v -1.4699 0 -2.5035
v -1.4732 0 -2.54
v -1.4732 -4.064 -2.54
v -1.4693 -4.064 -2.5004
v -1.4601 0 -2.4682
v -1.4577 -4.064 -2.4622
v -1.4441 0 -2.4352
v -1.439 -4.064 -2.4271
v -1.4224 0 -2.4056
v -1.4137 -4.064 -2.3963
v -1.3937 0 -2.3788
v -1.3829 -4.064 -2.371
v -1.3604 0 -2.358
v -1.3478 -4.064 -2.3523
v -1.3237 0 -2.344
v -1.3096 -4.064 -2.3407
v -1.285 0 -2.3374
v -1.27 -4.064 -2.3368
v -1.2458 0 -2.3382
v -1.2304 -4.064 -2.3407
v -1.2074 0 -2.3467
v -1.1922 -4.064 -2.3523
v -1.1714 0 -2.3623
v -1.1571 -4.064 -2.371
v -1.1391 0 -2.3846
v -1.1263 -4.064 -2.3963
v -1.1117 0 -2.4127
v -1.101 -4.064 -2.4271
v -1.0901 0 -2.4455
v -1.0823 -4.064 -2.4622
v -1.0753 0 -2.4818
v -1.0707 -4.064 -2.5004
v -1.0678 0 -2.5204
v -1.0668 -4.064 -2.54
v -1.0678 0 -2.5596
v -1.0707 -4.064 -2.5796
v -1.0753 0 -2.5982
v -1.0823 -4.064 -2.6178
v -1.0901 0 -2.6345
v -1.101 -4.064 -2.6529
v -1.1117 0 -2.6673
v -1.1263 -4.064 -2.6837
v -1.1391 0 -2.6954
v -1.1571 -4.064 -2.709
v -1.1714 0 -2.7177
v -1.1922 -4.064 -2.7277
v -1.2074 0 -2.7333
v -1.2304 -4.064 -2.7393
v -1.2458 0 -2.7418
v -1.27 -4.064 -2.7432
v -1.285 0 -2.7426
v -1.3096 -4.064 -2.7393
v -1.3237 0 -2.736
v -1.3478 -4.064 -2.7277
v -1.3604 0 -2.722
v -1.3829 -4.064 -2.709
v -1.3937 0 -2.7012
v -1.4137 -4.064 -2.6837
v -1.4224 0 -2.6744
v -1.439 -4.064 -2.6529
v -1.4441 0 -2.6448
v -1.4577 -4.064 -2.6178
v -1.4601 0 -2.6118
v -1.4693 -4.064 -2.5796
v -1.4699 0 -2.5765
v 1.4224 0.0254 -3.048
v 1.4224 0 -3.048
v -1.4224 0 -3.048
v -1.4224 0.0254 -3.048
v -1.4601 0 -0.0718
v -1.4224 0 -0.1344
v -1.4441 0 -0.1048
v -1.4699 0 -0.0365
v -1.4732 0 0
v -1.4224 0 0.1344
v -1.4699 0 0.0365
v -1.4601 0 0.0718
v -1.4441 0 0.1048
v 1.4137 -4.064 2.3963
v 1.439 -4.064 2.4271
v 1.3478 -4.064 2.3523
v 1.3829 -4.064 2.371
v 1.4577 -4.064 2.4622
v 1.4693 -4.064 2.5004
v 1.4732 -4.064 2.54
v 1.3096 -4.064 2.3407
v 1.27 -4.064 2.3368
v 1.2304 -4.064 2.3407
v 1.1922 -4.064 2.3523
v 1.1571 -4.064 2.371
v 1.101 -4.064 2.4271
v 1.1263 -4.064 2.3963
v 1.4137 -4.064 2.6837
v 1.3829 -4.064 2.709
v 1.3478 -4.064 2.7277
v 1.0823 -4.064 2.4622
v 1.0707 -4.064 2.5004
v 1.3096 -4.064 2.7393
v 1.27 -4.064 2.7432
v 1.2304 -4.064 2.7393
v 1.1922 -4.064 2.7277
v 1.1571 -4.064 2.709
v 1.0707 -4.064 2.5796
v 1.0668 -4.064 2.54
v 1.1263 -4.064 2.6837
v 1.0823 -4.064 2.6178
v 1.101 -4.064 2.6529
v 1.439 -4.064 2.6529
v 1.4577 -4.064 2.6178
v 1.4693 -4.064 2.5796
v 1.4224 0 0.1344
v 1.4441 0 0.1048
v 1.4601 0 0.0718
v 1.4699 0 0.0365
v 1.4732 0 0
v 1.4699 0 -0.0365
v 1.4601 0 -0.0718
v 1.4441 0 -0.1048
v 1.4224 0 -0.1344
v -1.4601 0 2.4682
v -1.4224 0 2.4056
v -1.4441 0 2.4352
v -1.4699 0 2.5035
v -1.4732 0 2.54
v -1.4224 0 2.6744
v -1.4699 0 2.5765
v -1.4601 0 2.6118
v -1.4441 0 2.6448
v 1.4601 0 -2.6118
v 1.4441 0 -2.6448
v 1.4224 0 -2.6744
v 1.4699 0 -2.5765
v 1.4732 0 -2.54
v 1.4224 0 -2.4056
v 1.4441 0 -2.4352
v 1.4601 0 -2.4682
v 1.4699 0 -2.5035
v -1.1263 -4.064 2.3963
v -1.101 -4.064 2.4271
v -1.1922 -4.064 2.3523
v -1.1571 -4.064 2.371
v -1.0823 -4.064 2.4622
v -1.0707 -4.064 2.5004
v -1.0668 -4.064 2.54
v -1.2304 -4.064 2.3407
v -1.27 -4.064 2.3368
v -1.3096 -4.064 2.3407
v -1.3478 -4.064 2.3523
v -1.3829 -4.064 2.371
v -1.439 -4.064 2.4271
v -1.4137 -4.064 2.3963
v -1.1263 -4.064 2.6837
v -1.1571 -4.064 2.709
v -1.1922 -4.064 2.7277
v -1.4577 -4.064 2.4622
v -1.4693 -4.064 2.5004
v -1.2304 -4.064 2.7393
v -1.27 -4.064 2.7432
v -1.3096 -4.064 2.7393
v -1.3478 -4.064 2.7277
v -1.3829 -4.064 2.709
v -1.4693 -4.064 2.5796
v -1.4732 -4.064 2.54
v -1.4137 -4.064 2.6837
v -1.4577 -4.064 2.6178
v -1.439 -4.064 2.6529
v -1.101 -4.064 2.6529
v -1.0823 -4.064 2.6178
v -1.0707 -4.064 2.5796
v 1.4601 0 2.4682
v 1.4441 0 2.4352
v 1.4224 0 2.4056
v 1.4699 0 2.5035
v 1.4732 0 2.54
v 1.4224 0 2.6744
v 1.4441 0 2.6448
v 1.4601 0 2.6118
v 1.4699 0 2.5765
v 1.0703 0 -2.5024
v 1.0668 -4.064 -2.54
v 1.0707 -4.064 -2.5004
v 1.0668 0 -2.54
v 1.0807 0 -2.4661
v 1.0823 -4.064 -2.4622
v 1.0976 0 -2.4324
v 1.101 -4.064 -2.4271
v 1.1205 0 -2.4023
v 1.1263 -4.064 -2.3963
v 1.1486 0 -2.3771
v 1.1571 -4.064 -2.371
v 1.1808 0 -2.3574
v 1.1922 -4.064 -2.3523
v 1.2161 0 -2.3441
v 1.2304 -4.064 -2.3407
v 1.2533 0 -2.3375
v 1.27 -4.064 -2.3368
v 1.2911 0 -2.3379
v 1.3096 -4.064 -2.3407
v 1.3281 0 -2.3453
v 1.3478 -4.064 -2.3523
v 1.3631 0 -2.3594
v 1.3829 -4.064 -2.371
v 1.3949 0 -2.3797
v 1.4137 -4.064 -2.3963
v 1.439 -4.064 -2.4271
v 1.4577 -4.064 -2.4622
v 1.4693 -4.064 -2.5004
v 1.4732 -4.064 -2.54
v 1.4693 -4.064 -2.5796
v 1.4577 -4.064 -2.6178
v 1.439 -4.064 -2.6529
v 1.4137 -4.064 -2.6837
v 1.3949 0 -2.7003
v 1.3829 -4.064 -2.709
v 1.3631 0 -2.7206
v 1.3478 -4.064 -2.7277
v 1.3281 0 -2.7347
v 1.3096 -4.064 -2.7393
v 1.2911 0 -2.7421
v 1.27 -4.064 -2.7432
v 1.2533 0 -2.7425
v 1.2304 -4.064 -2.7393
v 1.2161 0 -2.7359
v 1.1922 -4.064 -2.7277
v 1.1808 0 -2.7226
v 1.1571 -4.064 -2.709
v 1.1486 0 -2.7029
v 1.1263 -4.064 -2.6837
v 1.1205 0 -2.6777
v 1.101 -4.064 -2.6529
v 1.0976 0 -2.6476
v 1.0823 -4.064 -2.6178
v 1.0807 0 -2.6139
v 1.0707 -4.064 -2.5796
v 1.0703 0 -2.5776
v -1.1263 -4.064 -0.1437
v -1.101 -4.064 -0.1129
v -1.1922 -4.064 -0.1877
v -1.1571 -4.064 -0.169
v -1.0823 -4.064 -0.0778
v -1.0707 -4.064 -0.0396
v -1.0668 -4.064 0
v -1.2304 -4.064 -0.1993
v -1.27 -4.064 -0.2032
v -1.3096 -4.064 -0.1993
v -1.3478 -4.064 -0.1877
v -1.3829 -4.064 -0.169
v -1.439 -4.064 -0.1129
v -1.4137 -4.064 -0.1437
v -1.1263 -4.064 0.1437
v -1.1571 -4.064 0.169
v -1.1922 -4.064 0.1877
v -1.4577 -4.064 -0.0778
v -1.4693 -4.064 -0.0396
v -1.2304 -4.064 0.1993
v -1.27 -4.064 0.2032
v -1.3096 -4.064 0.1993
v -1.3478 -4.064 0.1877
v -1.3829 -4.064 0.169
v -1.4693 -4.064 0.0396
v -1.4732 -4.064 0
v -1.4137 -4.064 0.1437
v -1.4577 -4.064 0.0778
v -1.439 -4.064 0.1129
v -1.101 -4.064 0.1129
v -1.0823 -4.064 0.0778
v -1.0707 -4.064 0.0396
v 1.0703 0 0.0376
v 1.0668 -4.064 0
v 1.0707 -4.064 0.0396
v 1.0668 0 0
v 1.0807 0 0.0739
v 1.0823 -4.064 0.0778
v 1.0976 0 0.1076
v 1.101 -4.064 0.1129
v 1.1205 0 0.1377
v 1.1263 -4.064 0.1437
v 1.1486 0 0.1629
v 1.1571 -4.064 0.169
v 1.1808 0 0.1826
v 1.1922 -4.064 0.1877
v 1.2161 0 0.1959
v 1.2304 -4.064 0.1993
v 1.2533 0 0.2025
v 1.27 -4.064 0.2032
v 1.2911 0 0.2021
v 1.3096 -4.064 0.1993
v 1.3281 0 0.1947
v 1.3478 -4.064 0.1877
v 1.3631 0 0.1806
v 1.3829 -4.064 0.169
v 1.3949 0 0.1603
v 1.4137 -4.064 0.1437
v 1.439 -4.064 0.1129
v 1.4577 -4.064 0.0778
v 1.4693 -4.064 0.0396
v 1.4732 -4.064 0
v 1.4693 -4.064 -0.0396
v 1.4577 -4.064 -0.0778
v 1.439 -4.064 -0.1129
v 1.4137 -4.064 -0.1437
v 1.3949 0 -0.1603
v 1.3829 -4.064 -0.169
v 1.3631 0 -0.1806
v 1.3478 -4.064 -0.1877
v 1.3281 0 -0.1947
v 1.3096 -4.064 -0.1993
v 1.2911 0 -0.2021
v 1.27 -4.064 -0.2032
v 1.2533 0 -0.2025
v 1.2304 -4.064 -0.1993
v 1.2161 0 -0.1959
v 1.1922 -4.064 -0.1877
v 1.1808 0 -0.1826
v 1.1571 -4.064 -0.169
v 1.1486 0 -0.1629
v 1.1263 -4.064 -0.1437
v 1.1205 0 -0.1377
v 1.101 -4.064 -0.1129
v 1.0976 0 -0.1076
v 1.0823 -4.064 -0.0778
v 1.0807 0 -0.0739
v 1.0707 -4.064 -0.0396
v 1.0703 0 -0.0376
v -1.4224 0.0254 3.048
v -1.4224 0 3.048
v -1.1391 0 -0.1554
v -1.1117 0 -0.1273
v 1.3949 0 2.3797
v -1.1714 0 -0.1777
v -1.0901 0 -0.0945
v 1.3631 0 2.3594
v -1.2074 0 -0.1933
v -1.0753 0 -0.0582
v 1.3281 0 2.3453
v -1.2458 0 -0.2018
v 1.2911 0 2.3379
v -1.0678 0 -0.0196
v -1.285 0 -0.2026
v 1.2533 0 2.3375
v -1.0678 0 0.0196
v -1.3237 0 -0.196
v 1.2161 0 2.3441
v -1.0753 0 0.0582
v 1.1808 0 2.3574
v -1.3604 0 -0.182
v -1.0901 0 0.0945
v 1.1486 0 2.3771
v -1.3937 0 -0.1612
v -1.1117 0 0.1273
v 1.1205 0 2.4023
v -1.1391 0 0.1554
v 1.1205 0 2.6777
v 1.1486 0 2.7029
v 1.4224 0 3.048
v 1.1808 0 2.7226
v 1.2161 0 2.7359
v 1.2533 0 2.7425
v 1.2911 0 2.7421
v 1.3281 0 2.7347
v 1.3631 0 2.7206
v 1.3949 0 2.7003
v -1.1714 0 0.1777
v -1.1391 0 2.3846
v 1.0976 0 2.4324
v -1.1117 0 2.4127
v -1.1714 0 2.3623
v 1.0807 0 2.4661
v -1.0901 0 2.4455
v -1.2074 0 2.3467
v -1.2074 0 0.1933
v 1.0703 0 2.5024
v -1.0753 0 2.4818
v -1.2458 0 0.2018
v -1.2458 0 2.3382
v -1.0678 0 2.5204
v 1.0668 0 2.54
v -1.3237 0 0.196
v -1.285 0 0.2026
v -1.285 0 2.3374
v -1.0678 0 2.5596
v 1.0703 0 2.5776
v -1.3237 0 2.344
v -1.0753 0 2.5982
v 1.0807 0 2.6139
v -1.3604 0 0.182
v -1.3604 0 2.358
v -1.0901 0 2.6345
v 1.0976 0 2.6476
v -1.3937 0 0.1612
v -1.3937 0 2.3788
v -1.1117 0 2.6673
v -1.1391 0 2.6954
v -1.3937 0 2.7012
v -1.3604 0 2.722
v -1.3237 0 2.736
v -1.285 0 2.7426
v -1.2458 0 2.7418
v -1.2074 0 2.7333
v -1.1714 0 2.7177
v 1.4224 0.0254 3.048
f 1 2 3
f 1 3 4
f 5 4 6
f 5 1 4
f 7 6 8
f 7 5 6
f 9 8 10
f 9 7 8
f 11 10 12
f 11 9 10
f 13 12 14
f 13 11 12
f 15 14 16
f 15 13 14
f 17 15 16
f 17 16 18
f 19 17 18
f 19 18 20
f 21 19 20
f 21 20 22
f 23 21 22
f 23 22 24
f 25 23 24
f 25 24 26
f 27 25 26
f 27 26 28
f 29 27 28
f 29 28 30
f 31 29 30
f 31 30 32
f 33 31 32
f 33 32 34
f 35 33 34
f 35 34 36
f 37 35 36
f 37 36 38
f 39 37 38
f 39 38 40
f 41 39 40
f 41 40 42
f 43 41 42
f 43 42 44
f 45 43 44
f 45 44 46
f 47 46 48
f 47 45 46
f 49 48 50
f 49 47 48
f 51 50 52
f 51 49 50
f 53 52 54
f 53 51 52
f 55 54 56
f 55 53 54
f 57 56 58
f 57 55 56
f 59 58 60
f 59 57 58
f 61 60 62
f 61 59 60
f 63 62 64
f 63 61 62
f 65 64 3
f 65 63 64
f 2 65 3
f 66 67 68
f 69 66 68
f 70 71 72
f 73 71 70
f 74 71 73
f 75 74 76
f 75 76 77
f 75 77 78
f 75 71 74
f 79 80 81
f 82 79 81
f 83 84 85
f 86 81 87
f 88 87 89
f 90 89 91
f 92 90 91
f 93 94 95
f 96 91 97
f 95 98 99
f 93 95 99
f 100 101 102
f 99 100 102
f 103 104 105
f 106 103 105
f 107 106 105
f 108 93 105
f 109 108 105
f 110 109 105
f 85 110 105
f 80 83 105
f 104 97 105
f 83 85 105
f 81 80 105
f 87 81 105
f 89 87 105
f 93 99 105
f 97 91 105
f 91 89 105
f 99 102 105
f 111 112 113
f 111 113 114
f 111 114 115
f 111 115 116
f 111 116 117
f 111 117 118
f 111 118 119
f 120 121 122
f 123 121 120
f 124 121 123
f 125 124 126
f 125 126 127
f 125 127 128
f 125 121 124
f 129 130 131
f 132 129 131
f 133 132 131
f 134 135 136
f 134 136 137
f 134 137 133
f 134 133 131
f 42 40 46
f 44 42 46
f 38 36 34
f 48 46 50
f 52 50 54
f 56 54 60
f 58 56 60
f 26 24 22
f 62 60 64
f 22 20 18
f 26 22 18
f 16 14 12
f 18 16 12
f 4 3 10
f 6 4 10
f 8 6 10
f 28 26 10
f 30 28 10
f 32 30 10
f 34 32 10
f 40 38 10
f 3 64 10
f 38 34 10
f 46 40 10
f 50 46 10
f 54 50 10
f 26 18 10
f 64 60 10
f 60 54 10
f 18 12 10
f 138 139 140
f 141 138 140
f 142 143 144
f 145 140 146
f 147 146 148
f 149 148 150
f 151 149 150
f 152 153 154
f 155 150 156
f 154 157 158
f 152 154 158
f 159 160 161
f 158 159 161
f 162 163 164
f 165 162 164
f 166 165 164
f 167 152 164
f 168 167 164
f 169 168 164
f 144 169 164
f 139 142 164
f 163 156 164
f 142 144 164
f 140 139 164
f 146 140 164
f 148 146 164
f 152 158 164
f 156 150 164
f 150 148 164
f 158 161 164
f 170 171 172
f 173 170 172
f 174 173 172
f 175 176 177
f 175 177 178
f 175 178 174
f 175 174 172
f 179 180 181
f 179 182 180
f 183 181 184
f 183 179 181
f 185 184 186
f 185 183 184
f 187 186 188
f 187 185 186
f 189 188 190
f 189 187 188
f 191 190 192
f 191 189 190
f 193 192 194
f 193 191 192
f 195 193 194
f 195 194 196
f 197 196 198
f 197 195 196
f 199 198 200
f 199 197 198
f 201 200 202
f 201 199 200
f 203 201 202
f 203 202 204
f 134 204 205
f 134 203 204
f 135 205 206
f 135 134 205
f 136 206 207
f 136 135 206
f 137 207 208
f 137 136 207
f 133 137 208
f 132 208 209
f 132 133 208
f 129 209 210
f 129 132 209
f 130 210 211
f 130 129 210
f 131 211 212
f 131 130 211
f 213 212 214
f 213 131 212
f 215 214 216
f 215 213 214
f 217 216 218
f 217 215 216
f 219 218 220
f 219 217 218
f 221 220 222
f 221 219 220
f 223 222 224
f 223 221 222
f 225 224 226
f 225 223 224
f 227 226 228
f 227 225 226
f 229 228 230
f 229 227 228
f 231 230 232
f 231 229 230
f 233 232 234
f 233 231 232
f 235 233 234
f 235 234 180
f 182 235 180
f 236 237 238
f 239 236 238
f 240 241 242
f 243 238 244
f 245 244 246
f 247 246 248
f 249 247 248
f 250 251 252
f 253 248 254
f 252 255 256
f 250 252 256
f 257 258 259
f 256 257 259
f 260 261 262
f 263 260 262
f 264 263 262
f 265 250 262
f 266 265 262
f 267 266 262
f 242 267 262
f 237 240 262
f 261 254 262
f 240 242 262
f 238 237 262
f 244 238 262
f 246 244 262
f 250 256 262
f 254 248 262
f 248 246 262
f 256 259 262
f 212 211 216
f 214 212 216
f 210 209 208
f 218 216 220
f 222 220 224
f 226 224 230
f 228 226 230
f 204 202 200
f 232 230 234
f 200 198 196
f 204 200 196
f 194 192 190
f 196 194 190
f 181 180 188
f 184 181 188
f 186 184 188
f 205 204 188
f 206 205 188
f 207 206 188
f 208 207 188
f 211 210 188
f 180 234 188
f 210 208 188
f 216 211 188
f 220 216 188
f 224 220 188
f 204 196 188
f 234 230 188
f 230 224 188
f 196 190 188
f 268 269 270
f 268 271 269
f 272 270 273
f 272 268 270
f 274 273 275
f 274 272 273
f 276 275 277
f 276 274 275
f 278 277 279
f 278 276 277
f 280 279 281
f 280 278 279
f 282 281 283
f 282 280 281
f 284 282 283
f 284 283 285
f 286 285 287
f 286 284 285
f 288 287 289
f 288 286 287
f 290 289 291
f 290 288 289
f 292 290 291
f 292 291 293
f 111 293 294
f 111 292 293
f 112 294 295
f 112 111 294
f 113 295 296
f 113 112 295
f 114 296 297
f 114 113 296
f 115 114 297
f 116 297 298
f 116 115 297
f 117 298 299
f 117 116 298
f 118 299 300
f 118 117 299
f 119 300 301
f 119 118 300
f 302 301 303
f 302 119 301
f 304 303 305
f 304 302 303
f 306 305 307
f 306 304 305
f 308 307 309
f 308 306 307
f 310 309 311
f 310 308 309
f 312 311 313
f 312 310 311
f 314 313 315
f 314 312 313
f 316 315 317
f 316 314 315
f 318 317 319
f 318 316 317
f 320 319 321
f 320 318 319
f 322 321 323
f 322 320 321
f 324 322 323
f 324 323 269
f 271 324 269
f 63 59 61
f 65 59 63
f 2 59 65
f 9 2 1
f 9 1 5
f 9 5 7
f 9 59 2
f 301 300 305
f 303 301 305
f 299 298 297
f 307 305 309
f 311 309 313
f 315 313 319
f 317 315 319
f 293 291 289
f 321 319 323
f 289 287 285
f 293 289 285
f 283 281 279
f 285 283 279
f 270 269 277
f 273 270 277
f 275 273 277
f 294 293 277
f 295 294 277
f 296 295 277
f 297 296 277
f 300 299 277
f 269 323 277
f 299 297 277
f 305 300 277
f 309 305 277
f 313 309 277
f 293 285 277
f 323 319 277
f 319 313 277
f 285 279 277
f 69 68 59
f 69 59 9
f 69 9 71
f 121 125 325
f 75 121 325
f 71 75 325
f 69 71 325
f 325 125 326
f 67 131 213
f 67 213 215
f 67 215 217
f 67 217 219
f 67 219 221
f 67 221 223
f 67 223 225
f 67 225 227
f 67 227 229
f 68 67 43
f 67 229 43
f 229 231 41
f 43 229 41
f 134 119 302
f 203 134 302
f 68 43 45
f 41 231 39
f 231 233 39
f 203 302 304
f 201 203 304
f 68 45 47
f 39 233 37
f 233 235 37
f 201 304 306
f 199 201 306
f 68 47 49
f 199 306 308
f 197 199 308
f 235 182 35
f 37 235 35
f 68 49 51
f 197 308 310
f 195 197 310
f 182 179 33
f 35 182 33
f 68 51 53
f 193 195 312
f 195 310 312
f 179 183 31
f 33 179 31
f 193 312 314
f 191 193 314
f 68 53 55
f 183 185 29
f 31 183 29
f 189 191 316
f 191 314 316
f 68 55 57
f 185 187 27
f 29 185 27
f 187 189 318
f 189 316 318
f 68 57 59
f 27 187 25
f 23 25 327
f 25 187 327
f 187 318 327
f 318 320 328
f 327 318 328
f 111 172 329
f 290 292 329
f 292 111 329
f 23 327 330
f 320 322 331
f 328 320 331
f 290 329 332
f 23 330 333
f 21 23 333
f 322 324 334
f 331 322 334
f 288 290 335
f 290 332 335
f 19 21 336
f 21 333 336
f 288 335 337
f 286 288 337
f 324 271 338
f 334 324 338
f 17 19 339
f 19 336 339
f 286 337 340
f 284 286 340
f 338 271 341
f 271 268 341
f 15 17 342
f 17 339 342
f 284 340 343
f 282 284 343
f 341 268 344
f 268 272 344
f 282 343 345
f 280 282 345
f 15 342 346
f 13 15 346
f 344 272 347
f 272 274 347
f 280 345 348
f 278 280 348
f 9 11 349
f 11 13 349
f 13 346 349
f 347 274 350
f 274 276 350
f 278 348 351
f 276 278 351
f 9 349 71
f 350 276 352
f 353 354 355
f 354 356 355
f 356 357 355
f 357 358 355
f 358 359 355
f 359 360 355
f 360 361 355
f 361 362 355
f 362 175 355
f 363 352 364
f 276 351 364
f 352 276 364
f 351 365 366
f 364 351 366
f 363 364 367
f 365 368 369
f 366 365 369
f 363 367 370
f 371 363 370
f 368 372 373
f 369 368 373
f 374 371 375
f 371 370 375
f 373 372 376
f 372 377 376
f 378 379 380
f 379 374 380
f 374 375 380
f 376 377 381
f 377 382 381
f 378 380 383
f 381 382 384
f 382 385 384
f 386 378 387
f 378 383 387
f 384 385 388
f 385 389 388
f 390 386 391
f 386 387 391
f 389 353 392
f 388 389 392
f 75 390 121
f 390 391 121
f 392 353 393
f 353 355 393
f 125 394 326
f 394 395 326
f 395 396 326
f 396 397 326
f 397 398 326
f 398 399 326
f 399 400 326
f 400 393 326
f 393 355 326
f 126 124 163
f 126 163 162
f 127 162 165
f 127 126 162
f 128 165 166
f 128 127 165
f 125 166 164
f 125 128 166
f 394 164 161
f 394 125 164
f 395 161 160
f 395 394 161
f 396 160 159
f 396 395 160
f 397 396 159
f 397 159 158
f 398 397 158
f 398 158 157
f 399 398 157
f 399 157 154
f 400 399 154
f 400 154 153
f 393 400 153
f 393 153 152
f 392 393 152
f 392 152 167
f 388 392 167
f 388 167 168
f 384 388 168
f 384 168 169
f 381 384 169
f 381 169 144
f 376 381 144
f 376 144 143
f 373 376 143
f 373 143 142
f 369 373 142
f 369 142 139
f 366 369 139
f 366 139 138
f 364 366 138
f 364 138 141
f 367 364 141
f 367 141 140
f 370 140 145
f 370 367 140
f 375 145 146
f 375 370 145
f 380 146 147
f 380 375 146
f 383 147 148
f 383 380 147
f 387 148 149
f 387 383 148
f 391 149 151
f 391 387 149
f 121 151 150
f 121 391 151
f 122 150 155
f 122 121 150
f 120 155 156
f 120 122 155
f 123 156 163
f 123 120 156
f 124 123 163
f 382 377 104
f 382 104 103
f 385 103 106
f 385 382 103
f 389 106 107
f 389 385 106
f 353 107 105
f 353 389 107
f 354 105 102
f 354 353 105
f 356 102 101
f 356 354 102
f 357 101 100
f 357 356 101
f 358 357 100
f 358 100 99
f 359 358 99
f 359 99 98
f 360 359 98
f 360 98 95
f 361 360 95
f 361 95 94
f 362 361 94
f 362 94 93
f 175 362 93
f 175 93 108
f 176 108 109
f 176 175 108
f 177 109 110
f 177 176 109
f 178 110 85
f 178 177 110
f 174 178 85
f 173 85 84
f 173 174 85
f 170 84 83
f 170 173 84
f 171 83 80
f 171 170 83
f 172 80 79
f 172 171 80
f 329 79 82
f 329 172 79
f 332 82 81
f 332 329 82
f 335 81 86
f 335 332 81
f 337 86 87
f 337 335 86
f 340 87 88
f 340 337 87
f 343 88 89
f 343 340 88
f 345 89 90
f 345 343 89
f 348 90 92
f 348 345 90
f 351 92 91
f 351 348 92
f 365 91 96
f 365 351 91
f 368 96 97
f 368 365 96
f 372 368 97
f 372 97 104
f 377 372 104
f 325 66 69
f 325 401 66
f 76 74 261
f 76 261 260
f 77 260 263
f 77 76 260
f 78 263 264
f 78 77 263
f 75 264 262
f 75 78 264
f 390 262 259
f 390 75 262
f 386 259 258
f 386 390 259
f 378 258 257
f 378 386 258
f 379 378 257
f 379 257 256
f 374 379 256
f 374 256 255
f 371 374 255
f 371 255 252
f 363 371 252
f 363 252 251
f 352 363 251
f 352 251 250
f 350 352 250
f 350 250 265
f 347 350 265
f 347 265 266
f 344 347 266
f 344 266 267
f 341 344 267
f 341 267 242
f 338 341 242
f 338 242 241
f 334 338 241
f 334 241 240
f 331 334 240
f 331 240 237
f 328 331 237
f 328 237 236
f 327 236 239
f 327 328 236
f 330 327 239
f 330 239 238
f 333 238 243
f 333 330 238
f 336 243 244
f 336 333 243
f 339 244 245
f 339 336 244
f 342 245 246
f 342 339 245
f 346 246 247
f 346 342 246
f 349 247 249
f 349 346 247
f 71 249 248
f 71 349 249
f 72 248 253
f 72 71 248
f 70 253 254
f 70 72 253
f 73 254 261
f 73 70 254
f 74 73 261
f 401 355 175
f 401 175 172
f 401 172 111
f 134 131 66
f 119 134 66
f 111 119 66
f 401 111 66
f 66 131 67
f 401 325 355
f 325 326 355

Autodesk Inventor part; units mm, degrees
sketch "Sketch_1" plane through (0, 0, 0) normal (0, 1, 0) x (-1, 0, 0)
  line L0 (1.4224, 3.048) -> (-1.4224, 3.048)
  line L1 (-1.4224, 3.048) -> (-1.4224, -3.048)
  line L2 (-1.4224, -3.048) -> (1.4224, -3.048)
  line L3 (1.4224, -3.048) -> (1.4224, 3.048)
extrude "Extrusion1" add sketch "Sketch_1" along normal blind 0.0254
sketch "Sketch_2" plane through (0, 0, 0) normal (0, 1, 0) x (-1, 0, 0)
  circle A0 centre (-1.27, -2.54) radius 0.2032
extrude "Extrusion2" add sketch "Sketch_2" against normal blind 4.064
pattern_linear "Rectangular Pattern1" count 2 spacing 2.54 along (-1, 0, 0) count 3 spacing 2.54 along (0, 0, 1) of "Extrusion2"
ref_plane "to_body_XY" through (0, -0.9652, 0) normal (0, -1, 0) x (1, 0, 0)
ref_plane "to_body_YZ" through (0, -0.9652, 0) normal (1, 0, 0) x (0, 0, 1)
ref_plane "to_body_ZX" through (0, -0.9652, 0) normal (0, 0, 1) x (0, -1, 0)
properties part number "GP-terminals"
